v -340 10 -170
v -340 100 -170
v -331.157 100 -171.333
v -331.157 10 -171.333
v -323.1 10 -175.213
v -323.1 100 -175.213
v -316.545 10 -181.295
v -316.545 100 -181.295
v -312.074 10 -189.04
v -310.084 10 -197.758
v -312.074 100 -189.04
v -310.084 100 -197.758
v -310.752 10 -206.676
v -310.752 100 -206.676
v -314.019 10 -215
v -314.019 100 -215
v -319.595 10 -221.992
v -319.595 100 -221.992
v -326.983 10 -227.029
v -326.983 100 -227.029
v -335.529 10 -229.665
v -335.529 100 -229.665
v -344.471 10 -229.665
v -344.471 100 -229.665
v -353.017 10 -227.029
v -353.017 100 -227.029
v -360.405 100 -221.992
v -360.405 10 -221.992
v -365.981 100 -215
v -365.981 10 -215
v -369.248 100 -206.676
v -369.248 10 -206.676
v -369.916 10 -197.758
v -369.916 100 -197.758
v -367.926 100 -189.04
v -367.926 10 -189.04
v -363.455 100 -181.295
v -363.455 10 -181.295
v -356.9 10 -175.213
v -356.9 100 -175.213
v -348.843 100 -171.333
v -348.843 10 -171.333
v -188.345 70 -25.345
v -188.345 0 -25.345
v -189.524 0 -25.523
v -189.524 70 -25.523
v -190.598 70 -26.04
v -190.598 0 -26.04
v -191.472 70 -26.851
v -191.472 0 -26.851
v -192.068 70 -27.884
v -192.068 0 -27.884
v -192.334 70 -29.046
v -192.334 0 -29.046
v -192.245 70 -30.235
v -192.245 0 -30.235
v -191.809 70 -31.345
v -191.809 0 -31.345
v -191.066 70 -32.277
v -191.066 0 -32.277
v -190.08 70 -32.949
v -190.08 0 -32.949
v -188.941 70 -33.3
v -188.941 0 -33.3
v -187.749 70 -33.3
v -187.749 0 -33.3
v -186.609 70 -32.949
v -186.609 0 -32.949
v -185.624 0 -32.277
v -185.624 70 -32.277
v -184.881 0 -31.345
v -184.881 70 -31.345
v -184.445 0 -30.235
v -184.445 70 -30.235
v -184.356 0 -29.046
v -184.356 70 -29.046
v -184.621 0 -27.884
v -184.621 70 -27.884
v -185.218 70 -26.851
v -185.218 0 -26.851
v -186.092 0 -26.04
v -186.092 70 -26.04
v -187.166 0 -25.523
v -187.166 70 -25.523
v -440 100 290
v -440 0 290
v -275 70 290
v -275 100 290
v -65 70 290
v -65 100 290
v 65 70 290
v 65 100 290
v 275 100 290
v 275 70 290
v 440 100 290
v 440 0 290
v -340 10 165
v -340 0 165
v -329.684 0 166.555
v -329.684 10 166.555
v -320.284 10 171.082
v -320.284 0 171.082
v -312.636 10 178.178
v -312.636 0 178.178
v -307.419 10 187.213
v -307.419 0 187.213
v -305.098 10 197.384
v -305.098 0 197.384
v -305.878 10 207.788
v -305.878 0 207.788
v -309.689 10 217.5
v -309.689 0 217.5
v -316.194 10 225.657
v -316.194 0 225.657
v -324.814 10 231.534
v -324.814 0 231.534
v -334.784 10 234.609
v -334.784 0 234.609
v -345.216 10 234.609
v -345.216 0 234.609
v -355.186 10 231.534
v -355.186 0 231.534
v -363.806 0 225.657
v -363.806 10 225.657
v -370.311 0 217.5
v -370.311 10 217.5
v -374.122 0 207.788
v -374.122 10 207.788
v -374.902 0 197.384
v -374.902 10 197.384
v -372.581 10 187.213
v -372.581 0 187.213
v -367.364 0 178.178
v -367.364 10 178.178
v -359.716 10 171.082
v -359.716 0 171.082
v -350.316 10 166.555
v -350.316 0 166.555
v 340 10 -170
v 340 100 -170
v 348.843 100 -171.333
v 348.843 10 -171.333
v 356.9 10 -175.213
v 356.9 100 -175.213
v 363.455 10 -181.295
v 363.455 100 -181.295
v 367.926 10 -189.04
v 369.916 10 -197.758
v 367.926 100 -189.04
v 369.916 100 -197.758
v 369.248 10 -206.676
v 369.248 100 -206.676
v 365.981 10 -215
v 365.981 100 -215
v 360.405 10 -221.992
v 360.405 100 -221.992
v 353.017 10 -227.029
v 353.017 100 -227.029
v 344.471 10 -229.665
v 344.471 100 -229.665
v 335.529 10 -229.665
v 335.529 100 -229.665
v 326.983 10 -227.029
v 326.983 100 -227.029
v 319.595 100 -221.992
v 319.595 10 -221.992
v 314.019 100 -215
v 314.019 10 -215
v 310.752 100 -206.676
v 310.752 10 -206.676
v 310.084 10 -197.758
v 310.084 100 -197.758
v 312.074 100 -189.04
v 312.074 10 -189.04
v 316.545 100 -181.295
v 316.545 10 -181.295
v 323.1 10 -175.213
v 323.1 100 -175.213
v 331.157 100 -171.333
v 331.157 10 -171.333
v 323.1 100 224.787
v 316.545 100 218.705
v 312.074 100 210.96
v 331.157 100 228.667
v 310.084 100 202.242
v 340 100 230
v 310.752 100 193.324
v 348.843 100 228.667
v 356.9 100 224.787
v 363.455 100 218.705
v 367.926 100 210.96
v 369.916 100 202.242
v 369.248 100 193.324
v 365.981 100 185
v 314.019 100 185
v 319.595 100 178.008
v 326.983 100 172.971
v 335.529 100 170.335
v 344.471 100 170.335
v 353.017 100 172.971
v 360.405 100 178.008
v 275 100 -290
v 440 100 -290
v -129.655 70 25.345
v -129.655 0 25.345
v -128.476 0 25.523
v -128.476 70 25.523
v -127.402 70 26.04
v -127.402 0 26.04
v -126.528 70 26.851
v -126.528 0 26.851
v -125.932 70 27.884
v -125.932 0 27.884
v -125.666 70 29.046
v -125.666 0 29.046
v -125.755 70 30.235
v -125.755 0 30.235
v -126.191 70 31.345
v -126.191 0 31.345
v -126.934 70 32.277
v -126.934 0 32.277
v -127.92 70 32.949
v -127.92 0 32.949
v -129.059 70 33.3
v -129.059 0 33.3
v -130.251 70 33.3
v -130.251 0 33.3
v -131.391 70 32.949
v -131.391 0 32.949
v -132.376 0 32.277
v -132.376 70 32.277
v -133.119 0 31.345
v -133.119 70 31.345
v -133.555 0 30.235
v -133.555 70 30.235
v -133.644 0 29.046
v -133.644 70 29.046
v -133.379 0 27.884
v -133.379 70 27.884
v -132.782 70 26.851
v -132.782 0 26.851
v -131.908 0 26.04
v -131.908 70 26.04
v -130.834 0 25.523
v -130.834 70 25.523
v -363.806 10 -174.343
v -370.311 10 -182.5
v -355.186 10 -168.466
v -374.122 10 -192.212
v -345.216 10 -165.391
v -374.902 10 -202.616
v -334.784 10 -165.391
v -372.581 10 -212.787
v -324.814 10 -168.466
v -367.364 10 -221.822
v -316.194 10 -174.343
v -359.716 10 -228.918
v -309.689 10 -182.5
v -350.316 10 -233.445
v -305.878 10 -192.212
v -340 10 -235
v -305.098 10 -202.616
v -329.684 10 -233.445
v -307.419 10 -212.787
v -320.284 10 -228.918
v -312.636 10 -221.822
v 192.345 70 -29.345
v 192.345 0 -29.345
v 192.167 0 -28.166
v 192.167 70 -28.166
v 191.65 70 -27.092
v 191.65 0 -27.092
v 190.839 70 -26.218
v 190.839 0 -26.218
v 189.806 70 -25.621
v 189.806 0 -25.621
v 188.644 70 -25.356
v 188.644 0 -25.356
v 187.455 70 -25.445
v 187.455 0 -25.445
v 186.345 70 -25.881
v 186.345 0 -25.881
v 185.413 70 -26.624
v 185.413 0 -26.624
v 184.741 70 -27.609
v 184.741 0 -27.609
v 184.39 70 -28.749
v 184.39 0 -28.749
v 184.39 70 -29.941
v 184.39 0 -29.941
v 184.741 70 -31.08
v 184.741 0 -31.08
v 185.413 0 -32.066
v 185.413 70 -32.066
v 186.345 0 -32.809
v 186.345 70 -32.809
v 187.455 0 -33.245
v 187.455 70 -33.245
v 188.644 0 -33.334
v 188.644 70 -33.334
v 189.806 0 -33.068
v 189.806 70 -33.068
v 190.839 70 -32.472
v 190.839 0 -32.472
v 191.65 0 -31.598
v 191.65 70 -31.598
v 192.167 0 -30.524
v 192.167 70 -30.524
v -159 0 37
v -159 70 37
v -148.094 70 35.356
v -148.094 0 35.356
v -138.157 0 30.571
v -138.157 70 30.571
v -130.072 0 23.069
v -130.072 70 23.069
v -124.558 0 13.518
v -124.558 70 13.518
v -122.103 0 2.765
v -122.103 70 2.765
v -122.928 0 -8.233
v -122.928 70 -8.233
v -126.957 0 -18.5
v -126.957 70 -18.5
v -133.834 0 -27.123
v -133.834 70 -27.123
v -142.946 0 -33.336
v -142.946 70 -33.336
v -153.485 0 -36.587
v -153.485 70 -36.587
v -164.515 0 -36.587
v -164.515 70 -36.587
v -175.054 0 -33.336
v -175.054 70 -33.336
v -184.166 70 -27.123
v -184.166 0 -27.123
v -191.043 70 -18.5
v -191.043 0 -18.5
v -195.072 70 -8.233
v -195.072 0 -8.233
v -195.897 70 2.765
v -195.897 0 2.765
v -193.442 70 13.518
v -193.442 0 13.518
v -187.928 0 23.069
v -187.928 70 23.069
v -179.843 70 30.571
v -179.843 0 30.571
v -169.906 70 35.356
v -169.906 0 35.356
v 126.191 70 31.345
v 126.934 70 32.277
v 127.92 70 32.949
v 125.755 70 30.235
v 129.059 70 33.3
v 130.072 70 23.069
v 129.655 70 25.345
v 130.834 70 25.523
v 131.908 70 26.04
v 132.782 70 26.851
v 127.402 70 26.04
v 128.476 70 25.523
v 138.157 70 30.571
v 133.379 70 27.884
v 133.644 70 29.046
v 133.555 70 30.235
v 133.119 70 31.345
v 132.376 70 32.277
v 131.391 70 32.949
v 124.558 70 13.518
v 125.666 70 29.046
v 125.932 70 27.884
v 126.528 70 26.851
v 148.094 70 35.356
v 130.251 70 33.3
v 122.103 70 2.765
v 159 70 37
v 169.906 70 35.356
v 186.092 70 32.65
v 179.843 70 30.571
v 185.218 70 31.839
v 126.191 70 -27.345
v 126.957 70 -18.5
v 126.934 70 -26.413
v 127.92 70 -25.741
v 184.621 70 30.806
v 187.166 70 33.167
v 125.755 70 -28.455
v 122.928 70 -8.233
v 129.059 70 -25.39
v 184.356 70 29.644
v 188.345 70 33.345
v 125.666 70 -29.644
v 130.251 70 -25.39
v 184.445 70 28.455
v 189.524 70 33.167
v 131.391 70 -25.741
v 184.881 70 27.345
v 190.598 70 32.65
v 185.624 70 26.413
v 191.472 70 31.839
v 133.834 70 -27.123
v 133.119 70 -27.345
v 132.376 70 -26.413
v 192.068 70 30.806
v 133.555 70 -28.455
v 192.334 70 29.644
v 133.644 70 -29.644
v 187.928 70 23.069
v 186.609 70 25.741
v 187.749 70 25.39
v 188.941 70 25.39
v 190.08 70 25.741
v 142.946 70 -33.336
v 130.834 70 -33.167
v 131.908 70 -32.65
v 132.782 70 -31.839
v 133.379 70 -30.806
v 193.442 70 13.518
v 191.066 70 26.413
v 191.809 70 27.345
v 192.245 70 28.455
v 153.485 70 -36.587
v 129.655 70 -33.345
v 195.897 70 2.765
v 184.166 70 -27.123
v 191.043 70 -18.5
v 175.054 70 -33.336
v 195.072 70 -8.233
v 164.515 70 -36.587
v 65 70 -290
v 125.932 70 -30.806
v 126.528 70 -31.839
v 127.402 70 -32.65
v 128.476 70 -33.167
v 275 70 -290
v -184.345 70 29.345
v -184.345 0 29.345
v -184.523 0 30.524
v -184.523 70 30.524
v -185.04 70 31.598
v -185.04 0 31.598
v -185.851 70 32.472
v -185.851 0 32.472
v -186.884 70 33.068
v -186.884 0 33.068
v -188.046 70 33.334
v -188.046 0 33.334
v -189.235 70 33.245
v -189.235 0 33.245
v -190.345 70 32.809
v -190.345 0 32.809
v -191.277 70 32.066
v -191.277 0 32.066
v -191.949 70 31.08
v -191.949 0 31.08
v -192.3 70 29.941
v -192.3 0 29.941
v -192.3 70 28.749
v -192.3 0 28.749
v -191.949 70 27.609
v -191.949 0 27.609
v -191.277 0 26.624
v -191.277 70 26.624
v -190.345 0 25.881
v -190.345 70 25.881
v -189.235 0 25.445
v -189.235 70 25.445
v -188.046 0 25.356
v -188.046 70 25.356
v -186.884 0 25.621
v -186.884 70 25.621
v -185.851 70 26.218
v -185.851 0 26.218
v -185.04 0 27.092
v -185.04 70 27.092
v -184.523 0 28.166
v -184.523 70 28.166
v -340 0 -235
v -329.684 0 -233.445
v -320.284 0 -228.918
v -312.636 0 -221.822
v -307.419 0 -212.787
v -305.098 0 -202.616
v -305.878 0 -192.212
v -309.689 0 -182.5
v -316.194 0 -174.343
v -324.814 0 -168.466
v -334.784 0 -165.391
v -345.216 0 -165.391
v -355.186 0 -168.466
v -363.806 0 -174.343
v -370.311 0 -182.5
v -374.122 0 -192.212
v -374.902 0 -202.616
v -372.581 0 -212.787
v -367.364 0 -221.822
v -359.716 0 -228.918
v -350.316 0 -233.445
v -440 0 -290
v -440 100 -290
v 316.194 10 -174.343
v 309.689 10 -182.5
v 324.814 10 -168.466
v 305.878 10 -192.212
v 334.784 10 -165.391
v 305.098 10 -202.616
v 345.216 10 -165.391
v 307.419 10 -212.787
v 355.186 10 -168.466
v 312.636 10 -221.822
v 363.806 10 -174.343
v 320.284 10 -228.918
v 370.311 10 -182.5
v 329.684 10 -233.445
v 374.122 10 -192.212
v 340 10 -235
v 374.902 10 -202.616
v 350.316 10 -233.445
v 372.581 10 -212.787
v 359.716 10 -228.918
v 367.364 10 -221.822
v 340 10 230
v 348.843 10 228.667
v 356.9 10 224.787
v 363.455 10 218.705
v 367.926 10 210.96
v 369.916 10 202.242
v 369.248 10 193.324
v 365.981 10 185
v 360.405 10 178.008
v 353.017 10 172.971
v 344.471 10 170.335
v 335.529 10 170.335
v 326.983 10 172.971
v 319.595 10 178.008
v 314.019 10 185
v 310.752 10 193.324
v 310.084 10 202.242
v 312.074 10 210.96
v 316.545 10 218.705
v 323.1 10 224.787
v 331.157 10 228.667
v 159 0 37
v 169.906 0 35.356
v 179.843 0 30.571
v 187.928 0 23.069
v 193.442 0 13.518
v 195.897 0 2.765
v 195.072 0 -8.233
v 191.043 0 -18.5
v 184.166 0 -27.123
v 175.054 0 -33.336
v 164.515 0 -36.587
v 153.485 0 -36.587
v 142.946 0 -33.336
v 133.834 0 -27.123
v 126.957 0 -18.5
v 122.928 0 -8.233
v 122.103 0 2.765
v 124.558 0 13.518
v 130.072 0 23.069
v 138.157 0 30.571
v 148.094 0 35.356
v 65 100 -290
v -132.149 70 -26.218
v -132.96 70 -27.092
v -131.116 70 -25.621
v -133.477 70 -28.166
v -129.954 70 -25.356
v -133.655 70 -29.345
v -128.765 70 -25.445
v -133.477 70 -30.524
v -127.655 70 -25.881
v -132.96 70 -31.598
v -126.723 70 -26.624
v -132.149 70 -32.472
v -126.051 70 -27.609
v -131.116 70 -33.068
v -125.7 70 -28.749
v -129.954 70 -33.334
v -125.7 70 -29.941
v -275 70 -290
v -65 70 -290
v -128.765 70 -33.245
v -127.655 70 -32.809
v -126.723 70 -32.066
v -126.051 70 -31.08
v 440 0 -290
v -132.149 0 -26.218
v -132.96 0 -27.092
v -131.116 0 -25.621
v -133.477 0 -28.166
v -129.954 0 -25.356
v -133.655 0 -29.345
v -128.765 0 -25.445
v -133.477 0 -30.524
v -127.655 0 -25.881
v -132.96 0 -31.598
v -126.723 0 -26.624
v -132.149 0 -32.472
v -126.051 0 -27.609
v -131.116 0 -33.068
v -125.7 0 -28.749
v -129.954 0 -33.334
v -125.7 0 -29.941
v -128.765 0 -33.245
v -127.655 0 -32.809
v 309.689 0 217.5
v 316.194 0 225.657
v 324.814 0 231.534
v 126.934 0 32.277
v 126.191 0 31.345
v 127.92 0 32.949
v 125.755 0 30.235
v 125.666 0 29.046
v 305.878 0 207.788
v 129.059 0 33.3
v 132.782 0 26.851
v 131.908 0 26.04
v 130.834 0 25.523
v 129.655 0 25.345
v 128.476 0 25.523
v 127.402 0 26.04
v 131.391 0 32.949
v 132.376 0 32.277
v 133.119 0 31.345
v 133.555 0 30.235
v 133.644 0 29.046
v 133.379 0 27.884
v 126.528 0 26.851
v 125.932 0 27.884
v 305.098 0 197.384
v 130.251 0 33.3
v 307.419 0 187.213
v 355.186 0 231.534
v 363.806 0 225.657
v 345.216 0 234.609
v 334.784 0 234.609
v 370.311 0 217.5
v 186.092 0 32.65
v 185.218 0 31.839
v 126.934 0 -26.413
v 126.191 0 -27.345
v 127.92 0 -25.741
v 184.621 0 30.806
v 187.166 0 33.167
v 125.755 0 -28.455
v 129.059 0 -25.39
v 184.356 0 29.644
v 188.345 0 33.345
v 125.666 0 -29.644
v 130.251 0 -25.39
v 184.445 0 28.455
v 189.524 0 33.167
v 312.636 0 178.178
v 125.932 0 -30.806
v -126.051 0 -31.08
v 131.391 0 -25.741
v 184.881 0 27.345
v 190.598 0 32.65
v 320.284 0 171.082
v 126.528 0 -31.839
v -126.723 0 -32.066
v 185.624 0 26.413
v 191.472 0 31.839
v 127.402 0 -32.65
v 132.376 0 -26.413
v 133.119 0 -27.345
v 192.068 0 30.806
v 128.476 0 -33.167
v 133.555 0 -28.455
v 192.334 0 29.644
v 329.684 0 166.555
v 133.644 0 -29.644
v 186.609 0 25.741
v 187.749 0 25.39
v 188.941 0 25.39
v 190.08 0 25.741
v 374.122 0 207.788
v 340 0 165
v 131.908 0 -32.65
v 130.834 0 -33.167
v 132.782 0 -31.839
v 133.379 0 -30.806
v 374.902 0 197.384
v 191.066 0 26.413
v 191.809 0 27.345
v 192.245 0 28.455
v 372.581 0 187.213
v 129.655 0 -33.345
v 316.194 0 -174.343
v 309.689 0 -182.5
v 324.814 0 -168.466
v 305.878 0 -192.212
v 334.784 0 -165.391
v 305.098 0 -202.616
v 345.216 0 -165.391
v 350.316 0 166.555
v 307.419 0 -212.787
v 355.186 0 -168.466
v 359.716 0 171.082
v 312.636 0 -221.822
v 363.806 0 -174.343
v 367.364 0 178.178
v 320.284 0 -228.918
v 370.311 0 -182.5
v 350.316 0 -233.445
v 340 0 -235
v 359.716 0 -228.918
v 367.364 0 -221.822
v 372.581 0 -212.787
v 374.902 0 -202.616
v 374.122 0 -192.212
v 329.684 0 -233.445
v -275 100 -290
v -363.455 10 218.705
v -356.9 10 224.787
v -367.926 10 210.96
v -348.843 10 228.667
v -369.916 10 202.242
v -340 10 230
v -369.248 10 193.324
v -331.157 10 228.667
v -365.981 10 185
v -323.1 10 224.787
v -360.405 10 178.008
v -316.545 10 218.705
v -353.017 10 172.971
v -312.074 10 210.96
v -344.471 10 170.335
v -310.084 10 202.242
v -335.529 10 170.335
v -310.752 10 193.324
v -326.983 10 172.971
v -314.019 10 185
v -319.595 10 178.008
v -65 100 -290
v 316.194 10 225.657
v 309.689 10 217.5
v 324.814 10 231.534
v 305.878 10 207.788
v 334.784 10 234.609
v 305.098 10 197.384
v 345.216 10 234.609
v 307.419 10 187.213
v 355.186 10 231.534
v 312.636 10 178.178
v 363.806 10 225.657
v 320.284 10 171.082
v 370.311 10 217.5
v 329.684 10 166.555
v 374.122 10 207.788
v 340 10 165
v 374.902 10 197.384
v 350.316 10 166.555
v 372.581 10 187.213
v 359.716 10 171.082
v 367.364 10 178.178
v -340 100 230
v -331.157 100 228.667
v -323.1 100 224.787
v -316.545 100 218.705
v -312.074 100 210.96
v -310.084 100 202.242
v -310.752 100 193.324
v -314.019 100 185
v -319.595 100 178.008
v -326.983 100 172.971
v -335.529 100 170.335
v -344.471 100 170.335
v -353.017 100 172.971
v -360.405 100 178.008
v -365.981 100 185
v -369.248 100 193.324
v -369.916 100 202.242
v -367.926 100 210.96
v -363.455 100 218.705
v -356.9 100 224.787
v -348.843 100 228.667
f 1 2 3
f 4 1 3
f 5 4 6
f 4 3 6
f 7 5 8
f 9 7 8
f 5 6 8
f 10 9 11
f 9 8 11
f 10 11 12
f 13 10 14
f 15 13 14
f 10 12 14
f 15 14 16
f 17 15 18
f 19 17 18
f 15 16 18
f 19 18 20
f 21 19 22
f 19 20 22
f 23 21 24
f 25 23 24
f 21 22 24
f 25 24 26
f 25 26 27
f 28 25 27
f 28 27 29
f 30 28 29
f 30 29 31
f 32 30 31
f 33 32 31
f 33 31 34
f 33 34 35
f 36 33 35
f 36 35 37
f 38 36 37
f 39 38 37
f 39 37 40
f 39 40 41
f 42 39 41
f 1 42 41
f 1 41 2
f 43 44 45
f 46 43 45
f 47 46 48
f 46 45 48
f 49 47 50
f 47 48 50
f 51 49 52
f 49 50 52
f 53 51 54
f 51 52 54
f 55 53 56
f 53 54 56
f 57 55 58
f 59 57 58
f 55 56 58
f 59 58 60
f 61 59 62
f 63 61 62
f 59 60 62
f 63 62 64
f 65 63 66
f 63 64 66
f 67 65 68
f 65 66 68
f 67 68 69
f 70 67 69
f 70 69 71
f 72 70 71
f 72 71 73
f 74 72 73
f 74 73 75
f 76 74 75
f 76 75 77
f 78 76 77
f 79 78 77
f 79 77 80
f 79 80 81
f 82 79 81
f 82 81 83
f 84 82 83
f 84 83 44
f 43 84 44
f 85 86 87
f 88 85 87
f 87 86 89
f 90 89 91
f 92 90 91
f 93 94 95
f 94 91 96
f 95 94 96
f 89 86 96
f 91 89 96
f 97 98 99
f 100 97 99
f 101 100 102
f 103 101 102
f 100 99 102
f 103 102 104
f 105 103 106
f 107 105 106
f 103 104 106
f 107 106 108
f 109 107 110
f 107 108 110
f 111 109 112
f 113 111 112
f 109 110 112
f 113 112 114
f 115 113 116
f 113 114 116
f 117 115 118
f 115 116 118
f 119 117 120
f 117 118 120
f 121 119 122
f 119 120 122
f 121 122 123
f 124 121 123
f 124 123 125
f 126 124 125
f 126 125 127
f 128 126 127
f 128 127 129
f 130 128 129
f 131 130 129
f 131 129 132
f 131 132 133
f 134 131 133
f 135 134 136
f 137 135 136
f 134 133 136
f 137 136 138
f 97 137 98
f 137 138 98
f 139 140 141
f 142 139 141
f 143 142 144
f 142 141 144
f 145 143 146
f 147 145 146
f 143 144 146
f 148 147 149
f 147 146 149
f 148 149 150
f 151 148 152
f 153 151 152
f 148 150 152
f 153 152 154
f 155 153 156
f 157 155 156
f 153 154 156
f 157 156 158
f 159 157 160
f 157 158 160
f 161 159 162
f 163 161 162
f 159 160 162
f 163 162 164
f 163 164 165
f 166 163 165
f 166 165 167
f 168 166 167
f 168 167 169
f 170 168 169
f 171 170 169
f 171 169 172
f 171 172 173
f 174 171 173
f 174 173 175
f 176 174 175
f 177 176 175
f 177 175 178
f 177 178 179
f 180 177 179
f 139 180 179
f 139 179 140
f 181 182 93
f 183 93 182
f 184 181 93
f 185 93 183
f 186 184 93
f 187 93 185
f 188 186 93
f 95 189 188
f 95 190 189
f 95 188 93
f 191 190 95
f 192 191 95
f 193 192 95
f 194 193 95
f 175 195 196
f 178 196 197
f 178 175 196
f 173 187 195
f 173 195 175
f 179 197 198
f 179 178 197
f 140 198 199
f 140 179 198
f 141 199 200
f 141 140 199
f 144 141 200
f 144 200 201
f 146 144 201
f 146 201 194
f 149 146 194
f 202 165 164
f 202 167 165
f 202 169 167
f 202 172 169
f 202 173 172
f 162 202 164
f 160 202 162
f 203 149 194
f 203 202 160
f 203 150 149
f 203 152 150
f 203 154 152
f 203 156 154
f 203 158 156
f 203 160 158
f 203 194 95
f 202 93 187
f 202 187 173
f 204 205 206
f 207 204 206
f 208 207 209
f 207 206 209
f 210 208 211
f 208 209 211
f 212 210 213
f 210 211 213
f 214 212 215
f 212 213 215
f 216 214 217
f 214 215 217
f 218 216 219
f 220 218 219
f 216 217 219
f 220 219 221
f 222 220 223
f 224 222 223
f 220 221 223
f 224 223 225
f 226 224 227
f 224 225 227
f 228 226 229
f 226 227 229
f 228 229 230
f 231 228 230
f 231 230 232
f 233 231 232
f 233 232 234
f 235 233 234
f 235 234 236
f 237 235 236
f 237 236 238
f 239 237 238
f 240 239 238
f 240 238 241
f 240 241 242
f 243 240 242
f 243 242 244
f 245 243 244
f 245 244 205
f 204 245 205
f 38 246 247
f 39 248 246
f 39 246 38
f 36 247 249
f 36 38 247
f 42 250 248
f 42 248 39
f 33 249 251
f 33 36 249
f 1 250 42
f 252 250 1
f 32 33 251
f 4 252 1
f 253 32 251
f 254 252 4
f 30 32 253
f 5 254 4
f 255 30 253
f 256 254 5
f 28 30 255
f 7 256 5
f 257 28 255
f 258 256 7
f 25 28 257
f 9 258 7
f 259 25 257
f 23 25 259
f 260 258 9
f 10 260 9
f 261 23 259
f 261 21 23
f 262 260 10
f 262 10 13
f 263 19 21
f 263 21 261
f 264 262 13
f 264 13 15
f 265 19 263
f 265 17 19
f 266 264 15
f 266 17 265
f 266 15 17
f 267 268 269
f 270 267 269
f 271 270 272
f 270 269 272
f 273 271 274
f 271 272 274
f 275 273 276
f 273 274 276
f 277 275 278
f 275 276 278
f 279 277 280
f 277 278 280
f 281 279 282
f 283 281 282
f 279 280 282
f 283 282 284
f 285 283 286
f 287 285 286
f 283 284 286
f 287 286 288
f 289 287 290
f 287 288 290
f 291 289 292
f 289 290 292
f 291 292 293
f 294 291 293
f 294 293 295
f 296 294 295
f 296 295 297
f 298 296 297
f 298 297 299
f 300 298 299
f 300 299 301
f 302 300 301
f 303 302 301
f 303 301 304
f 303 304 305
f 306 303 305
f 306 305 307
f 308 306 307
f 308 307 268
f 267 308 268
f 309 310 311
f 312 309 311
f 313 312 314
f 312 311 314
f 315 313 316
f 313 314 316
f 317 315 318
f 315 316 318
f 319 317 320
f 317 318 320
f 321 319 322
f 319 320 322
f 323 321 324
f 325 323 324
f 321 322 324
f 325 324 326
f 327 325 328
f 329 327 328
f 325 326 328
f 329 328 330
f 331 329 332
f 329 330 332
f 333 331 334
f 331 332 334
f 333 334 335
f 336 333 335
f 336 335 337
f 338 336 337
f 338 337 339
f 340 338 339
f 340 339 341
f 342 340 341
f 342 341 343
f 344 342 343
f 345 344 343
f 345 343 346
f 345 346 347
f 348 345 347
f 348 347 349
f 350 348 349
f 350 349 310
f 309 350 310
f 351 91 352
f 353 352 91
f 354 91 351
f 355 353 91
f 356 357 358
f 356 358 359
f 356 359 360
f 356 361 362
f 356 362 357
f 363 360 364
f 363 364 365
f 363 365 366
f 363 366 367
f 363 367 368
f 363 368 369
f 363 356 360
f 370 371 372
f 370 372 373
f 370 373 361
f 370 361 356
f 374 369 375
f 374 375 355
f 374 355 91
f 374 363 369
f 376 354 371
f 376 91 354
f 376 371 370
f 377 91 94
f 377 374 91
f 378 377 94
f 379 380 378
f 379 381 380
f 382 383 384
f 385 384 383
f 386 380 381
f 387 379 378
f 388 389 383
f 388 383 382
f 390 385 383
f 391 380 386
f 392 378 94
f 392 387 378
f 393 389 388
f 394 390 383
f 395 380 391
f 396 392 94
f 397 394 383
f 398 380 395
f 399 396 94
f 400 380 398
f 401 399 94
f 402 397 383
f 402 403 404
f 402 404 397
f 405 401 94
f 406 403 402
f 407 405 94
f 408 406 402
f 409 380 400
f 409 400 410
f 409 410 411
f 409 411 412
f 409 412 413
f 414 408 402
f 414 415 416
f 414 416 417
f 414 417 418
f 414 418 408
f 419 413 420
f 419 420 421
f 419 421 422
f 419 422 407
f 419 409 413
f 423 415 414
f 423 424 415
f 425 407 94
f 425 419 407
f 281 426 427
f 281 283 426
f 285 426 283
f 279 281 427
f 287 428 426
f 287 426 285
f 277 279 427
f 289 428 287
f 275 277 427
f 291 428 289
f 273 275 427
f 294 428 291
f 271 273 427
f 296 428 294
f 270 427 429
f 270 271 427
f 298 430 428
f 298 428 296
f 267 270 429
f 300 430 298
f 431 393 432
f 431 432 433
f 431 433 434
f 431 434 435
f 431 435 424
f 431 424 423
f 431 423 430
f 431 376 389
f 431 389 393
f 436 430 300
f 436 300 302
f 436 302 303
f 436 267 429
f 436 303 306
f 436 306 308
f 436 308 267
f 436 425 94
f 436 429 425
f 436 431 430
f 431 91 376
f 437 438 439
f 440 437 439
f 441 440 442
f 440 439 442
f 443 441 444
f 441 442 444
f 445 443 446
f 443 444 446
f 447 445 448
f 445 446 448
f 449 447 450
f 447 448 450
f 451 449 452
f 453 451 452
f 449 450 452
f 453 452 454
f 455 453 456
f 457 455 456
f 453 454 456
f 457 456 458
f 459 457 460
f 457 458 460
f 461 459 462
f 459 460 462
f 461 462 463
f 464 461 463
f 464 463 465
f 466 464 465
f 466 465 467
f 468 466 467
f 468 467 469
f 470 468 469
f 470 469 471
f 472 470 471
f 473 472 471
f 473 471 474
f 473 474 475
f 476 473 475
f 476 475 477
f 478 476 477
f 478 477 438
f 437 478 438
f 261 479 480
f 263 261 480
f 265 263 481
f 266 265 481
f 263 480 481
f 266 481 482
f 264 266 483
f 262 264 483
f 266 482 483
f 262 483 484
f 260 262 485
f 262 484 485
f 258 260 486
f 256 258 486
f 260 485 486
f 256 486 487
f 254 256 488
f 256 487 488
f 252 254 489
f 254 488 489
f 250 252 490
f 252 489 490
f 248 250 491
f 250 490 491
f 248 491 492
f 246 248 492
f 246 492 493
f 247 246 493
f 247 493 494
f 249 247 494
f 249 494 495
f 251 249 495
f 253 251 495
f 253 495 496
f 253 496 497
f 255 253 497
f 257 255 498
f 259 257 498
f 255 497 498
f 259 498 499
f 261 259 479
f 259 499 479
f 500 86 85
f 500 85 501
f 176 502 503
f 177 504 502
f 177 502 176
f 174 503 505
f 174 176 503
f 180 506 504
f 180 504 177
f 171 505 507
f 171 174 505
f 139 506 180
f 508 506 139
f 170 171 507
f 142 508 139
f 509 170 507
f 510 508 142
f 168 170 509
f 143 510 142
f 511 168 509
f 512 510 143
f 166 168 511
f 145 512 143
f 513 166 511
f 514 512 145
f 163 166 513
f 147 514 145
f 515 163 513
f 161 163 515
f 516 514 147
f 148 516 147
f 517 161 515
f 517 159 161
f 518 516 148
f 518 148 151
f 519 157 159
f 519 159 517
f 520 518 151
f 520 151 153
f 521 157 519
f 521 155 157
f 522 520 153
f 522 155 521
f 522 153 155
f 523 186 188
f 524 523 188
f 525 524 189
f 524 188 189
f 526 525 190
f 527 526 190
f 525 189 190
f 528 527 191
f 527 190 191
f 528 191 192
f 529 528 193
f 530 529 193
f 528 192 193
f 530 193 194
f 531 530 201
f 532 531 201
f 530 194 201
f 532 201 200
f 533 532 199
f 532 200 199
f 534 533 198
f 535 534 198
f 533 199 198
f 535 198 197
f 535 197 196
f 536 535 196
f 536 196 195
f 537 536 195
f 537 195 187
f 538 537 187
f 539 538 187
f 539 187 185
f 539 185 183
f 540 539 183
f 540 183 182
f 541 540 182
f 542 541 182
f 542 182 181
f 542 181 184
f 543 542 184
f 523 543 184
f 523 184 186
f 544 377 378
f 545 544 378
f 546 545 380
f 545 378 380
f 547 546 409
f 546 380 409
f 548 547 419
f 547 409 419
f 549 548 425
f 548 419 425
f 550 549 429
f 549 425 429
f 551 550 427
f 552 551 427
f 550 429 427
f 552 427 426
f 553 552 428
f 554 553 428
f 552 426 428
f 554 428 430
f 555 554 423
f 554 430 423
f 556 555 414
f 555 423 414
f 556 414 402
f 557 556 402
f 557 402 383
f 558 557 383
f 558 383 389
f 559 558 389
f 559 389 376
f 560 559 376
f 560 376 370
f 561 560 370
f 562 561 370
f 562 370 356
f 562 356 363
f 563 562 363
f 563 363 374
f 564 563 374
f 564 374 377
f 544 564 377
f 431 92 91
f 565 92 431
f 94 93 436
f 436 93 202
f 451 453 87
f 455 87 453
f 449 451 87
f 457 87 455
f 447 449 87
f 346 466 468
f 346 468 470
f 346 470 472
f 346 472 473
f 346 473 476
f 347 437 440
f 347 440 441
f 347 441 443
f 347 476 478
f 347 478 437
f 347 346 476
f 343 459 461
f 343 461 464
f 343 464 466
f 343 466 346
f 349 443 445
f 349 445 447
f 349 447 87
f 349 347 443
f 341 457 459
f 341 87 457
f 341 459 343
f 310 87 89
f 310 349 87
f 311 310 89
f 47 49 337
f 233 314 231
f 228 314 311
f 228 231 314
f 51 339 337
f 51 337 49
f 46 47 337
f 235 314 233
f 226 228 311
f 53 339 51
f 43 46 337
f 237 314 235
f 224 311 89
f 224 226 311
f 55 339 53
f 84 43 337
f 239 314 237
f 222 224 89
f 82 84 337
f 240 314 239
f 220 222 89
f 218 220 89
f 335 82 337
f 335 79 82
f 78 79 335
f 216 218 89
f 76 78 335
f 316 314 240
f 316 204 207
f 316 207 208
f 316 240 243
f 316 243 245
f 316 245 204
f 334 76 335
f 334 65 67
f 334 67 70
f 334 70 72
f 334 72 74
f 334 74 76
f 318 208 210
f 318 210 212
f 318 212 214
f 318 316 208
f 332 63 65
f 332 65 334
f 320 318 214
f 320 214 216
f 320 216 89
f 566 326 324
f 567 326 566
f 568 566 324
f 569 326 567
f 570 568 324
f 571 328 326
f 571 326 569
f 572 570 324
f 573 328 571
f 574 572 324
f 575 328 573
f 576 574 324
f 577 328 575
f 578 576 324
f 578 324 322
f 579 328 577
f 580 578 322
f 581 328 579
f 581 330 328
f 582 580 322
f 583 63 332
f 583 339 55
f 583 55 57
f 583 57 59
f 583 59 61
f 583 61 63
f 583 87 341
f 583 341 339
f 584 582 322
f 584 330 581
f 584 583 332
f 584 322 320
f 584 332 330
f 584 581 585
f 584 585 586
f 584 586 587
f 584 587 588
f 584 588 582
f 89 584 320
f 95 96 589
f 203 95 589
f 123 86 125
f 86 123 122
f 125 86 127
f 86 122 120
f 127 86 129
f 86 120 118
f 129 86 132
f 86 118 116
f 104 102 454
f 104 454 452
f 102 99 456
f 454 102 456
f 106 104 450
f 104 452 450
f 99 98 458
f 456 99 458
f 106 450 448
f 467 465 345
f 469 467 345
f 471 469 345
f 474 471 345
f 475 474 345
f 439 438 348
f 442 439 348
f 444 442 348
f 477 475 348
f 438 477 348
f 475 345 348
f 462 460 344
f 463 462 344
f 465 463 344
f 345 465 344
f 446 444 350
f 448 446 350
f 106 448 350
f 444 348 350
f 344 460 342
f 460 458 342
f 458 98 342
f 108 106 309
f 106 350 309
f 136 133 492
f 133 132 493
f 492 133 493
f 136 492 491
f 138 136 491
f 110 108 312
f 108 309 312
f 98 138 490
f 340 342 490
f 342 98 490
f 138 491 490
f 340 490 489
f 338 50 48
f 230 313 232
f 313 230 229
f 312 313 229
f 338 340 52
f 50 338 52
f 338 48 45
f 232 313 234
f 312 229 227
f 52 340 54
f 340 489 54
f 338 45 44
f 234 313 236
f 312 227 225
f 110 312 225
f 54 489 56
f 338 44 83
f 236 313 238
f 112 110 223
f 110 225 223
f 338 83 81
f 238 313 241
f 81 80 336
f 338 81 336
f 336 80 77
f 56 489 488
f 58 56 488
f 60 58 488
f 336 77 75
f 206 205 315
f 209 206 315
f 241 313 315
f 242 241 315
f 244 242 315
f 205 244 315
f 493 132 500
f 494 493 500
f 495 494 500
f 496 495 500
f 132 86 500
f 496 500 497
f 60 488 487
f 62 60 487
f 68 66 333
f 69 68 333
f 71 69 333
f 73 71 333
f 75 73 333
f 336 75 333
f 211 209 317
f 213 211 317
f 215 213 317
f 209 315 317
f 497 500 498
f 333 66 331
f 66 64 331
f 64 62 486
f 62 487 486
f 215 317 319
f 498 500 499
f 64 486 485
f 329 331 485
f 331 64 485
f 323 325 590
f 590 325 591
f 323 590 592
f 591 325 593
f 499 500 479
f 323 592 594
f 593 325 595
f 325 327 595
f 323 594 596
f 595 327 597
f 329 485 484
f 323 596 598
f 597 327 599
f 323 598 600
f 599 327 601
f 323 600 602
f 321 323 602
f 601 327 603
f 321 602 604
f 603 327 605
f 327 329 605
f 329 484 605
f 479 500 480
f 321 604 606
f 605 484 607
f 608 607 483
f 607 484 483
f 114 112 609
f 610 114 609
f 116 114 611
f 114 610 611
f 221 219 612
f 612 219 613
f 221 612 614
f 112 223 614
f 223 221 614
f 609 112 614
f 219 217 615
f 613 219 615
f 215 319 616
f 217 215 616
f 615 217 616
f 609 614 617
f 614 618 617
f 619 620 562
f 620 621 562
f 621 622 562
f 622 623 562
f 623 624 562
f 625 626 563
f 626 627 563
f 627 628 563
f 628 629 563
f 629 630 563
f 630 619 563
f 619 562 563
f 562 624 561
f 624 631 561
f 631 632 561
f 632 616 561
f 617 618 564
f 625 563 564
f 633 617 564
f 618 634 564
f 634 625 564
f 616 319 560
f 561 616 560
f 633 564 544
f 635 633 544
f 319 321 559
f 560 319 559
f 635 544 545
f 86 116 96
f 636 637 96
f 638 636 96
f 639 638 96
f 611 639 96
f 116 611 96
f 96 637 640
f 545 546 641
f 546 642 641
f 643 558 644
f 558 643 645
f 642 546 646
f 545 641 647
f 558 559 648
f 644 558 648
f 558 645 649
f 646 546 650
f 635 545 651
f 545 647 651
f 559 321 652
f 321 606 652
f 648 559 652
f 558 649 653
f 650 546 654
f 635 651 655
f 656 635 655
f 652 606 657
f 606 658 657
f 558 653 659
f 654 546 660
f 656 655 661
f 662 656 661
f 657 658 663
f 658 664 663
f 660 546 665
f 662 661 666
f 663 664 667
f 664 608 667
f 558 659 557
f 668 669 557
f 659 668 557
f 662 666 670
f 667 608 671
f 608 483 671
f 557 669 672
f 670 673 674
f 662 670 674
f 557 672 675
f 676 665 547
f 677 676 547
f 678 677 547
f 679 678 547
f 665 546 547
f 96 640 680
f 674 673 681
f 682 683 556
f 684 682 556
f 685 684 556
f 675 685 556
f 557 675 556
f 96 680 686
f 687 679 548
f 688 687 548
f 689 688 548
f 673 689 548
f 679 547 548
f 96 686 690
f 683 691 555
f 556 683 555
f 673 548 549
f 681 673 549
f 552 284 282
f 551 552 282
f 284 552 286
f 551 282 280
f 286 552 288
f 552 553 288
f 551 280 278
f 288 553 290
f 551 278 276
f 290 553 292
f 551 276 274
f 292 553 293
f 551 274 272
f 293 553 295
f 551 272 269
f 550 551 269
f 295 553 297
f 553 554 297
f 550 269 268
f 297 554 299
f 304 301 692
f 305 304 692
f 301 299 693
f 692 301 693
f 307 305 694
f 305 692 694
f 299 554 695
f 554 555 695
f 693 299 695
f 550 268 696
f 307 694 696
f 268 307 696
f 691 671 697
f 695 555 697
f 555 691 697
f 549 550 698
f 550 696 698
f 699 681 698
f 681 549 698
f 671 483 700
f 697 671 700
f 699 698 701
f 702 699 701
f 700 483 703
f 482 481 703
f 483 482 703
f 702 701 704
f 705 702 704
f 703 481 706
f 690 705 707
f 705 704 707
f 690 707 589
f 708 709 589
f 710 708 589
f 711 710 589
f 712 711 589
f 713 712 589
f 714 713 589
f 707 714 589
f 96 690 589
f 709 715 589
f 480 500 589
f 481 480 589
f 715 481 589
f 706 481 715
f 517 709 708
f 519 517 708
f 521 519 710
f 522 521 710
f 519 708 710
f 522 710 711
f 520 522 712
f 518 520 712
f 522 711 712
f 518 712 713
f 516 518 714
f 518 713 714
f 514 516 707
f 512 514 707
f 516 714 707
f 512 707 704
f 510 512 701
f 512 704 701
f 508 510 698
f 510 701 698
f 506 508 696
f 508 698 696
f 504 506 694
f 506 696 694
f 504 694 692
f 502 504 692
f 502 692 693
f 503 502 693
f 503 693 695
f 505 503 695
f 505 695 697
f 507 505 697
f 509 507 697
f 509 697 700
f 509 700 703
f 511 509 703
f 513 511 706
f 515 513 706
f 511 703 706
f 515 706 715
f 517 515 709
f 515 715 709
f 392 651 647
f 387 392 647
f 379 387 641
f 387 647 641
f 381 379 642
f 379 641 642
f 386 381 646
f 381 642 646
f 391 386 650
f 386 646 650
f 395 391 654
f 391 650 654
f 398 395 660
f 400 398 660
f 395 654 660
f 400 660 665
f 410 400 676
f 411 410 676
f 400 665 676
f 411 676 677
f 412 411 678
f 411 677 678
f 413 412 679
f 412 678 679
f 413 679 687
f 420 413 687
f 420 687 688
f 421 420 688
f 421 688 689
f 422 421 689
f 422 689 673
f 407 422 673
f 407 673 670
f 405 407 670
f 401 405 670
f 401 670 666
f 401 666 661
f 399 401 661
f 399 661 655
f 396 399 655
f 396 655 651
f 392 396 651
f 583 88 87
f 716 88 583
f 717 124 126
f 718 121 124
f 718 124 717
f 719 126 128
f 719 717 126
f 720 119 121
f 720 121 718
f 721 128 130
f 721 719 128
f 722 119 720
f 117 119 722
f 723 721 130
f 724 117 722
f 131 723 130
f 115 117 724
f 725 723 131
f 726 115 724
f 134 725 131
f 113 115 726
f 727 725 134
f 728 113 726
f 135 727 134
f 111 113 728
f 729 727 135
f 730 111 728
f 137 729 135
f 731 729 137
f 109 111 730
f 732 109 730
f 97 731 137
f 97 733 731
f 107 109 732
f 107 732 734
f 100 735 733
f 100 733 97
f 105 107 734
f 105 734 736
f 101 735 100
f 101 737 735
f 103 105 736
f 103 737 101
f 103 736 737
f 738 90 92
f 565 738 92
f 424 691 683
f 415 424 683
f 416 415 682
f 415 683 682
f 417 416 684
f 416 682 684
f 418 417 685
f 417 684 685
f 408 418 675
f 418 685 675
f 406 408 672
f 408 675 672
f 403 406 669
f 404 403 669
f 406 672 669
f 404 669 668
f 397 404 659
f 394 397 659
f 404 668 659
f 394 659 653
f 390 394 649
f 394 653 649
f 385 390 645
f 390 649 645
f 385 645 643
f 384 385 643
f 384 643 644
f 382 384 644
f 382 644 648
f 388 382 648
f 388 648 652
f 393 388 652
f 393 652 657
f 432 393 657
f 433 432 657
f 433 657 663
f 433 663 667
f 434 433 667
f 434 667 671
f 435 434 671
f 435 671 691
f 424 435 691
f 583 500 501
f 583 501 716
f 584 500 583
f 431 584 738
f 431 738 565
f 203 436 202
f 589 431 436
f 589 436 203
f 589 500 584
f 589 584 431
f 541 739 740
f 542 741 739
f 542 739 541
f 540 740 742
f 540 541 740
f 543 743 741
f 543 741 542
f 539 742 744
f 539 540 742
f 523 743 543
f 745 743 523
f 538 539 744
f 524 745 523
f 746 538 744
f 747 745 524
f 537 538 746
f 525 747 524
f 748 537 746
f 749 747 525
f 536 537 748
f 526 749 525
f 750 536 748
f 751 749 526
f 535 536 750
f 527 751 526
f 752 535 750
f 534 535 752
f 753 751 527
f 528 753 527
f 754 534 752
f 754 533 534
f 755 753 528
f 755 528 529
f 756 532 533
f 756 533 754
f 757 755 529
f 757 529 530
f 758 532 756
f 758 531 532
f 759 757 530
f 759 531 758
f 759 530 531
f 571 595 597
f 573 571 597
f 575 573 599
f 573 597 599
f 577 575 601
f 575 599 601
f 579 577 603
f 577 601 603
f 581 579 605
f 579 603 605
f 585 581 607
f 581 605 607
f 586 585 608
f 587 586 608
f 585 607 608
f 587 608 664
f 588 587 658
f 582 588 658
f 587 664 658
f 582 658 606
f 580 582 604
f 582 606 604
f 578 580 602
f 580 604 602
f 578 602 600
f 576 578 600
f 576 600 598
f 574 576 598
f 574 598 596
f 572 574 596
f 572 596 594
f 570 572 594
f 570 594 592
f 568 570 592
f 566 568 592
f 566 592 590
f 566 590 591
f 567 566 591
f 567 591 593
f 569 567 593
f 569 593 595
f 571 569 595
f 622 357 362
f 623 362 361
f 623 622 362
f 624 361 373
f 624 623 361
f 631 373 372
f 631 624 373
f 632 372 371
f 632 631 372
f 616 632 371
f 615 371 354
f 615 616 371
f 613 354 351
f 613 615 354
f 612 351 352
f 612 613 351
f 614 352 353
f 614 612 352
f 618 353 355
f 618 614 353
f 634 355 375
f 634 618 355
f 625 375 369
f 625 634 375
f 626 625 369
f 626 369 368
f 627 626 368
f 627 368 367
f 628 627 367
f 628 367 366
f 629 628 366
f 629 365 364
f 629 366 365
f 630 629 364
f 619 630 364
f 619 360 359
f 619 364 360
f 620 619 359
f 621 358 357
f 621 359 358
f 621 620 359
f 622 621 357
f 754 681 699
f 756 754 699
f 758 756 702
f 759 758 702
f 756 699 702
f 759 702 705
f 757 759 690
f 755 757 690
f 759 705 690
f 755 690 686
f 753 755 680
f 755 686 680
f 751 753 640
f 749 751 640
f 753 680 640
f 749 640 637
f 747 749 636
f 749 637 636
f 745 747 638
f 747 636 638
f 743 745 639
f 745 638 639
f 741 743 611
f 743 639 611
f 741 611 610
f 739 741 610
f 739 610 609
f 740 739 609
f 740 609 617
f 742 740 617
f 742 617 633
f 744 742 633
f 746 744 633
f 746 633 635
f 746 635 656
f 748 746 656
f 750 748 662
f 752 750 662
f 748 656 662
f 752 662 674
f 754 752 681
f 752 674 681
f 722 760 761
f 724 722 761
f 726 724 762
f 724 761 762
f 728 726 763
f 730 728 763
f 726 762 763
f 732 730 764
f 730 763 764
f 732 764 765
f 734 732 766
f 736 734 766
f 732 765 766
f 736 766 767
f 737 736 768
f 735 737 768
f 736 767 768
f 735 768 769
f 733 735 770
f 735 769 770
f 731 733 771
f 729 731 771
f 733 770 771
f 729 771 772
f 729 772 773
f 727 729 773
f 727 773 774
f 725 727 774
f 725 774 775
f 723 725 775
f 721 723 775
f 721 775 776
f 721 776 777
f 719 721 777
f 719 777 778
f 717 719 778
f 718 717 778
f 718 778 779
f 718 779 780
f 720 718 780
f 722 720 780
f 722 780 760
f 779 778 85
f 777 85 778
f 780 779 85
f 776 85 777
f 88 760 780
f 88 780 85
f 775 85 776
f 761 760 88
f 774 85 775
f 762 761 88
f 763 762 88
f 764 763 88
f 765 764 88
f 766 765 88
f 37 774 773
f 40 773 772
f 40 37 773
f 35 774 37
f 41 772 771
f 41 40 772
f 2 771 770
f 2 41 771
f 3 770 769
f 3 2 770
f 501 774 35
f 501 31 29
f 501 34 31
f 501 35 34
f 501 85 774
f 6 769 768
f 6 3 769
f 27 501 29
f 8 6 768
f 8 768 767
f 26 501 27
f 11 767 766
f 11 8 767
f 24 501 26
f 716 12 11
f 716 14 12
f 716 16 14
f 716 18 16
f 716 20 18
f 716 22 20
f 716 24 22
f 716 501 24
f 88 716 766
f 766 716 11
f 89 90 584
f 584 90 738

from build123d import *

# Parameters (mm, degrees)
SKETCH1_W               = 880
SKETCH1_H               = 580
BOSS_EXTRUDE1_DEPTH     = 100
SKETCH2_W               = 160
SKETCH2_H               = 580
CUT_EXTRUDE1_DEPTH      = 30
SKETCH3_W               = 210
SKETCH3_H               = 580
CUT_EXTRUDE2_DEPTH      = 30
SKETCH4_R               = 37
CUT_EXTRUDE3_DEPTH      = 264
SKETCH6_R               = 30
CUT_EXTRUDE5_DEPTH      = 271
SKETCH7_R               = 35
CUT_EXTRUDE6_DEPTH      = 10
SKETCH9_R               = 4
CUT_EXTRUDE14_DEPTH     = 500
CIRPATTERN2_COUNT       = 4
MIRROR2_COPY_1_SKETCH_R = 4
MIRROR2_COPY_1_DEPTH    = 500
MIRROR2_COPY_2_SKETCH_R = 4
MIRROR2_COPY_2_DEPTH    = 500
MIRROR2_COPY_3_SKETCH_R = 4
MIRROR2_COPY_3_DEPTH    = 500
MIRROR2_COPY_4_SKETCH_R = 4
MIRROR2_COPY_4_DEPTH    = 500


with BuildPart() as part:
    # Sketch1 → Boss-Extrude1 (new body)
    with BuildSketch(Plane(origin=(0, 0, 0), x_dir=(1, 0, 0), z_dir=(0, 1, 0))):
        Rectangle(SKETCH1_W, SKETCH1_H)
    extrude(amount=BOSS_EXTRUDE1_DEPTH)

    # Sketch2 → Cut-Extrude1 (cut)
    with BuildSketch(Plane(origin=(0, 100, 0), x_dir=(1, 0, 0), z_dir=(0, 1, 0))):
        with Locations((-145, 0)):
            Rectangle(SKETCH2_W, SKETCH2_H)
        with Locations((145, 0)):
            Rectangle(SKETCH2_W, SKETCH2_H)
    extrude(amount=-CUT_EXTRUDE1_DEPTH, mode=Mode.SUBTRACT)

    # Sketch3 → Cut-Extrude2 (cut)
    with BuildSketch(Plane(origin=(0, 100, 0), x_dir=(1, 0, 0), z_dir=(0, 1, 0))):
        with Locations((170, 0)):
            Rectangle(SKETCH3_W, SKETCH3_H)
        with Locations((-170, 0)):
            Rectangle(SKETCH3_W, SKETCH3_H)
    extrude(amount=-CUT_EXTRUDE2_DEPTH, mode=Mode.SUBTRACT)

    # Sketch4 → Cut-Extrude3 (cut)
    with BuildSketch(Plane(origin=(0, 70, 0), x_dir=(1, 0, 0), z_dir=(0, 1, 0))):
        with Locations((-159, 0)):
            Circle(SKETCH4_R)
        with Locations((159, 0)):
            Circle(SKETCH4_R)
    extrude(amount=-CUT_EXTRUDE3_DEPTH, mode=Mode.SUBTRACT)

    # Sketch6 → Cut-Extrude5 (cut)
    with BuildSketch(Plane(origin=(0, 100, 0), x_dir=(1, 0, 0), z_dir=(0, 1, 0))):
        with Locations((-340, 200)):
            Circle(SKETCH6_R)
        with Locations((340, 200)):
            Circle(SKETCH6_R)
        with Locations((340, -200)):
            Circle(SKETCH6_R)
        with Locations((-340, -200)):
            Circle(SKETCH6_R)
    extrude(amount=-CUT_EXTRUDE5_DEPTH, mode=Mode.SUBTRACT)

    # Sketch7 → Cut-Extrude6 (cut)
    with BuildSketch(Plane.XZ):
        with Locations((-340, 200)):
            Circle(SKETCH7_R)
        with Locations((340, 200)):
            Circle(SKETCH7_R)
        with Locations((-340, -200)):
            Circle(SKETCH7_R)
        with Locations((340, -200)):
            Circle(SKETCH7_R)
    extrude(amount=-CUT_EXTRUDE6_DEPTH, mode=Mode.SUBTRACT)

    # Sketch9 → Cut-Extrude14 (cut)
    with BuildSketch(Plane.XZ):
        with Locations((-129.655068581, 29.344931419)):
            Circle(SKETCH9_R)
    cut_extrude14 = extrude(amount=-CUT_EXTRUDE14_DEPTH, mode=Mode.SUBTRACT)

    # CirPattern2: Cut-Extrude14 ×4 about axis
    cirpattern2_axis = Axis((-159, 0, 0), (0, 1, 0))
    for i in range(1, CIRPATTERN2_COUNT):
        add(cut_extrude14.rotate(cirpattern2_axis, i * 360 / CIRPATTERN2_COUNT), mode=Mode.SUBTRACT)

    # Mirror2 copy 1 sketch → Mirror2 copy 1 (cut)
    with BuildSketch(Plane(origin=(159, 0, -159), x_dir=(0, 0, -1), z_dir=(0, -1, 0))):
        with Locations((-129.655068581, -29.344931419)):
            Circle(MIRROR2_COPY_1_SKETCH_R)
    extrude(amount=-MIRROR2_COPY_1_DEPTH, mode=Mode.SUBTRACT)

    # Mirror2 copy 2 sketch → Mirror2 copy 2 (cut)
    with BuildSketch(Plane(origin=(318, 0, 0), x_dir=(1, 0, 0), z_dir=(0, -1, 0))):
        with Locations((-129.655068581, -29.344931419)):
            Circle(MIRROR2_COPY_2_SKETCH_R)
    extrude(amount=-MIRROR2_COPY_2_DEPTH, mode=Mode.SUBTRACT)

    # Mirror2 copy 3 sketch → Mirror2 copy 3 (cut)
    with BuildSketch(Plane(origin=(159, 0, 159), x_dir=(0, 0, 1), z_dir=(0, -1, 0))):
        with Locations((-129.655068581, -29.344931419)):
            Circle(MIRROR2_COPY_3_SKETCH_R)
    extrude(amount=-MIRROR2_COPY_3_DEPTH, mode=Mode.SUBTRACT)

    # Mirror2 copy 4 sketch → Mirror2 copy 4 (cut)
    with BuildSketch(Plane(origin=(0, 0, 0), x_dir=(-1, 0, 0), z_dir=(0, -1, 0))):
        with Locations((-129.655068581, -29.344931419)):
            Circle(MIRROR2_COPY_4_SKETCH_R)
    extrude(amount=-MIRROR2_COPY_4_DEPTH, mode=Mode.SUBTRACT)


solid = part.part
